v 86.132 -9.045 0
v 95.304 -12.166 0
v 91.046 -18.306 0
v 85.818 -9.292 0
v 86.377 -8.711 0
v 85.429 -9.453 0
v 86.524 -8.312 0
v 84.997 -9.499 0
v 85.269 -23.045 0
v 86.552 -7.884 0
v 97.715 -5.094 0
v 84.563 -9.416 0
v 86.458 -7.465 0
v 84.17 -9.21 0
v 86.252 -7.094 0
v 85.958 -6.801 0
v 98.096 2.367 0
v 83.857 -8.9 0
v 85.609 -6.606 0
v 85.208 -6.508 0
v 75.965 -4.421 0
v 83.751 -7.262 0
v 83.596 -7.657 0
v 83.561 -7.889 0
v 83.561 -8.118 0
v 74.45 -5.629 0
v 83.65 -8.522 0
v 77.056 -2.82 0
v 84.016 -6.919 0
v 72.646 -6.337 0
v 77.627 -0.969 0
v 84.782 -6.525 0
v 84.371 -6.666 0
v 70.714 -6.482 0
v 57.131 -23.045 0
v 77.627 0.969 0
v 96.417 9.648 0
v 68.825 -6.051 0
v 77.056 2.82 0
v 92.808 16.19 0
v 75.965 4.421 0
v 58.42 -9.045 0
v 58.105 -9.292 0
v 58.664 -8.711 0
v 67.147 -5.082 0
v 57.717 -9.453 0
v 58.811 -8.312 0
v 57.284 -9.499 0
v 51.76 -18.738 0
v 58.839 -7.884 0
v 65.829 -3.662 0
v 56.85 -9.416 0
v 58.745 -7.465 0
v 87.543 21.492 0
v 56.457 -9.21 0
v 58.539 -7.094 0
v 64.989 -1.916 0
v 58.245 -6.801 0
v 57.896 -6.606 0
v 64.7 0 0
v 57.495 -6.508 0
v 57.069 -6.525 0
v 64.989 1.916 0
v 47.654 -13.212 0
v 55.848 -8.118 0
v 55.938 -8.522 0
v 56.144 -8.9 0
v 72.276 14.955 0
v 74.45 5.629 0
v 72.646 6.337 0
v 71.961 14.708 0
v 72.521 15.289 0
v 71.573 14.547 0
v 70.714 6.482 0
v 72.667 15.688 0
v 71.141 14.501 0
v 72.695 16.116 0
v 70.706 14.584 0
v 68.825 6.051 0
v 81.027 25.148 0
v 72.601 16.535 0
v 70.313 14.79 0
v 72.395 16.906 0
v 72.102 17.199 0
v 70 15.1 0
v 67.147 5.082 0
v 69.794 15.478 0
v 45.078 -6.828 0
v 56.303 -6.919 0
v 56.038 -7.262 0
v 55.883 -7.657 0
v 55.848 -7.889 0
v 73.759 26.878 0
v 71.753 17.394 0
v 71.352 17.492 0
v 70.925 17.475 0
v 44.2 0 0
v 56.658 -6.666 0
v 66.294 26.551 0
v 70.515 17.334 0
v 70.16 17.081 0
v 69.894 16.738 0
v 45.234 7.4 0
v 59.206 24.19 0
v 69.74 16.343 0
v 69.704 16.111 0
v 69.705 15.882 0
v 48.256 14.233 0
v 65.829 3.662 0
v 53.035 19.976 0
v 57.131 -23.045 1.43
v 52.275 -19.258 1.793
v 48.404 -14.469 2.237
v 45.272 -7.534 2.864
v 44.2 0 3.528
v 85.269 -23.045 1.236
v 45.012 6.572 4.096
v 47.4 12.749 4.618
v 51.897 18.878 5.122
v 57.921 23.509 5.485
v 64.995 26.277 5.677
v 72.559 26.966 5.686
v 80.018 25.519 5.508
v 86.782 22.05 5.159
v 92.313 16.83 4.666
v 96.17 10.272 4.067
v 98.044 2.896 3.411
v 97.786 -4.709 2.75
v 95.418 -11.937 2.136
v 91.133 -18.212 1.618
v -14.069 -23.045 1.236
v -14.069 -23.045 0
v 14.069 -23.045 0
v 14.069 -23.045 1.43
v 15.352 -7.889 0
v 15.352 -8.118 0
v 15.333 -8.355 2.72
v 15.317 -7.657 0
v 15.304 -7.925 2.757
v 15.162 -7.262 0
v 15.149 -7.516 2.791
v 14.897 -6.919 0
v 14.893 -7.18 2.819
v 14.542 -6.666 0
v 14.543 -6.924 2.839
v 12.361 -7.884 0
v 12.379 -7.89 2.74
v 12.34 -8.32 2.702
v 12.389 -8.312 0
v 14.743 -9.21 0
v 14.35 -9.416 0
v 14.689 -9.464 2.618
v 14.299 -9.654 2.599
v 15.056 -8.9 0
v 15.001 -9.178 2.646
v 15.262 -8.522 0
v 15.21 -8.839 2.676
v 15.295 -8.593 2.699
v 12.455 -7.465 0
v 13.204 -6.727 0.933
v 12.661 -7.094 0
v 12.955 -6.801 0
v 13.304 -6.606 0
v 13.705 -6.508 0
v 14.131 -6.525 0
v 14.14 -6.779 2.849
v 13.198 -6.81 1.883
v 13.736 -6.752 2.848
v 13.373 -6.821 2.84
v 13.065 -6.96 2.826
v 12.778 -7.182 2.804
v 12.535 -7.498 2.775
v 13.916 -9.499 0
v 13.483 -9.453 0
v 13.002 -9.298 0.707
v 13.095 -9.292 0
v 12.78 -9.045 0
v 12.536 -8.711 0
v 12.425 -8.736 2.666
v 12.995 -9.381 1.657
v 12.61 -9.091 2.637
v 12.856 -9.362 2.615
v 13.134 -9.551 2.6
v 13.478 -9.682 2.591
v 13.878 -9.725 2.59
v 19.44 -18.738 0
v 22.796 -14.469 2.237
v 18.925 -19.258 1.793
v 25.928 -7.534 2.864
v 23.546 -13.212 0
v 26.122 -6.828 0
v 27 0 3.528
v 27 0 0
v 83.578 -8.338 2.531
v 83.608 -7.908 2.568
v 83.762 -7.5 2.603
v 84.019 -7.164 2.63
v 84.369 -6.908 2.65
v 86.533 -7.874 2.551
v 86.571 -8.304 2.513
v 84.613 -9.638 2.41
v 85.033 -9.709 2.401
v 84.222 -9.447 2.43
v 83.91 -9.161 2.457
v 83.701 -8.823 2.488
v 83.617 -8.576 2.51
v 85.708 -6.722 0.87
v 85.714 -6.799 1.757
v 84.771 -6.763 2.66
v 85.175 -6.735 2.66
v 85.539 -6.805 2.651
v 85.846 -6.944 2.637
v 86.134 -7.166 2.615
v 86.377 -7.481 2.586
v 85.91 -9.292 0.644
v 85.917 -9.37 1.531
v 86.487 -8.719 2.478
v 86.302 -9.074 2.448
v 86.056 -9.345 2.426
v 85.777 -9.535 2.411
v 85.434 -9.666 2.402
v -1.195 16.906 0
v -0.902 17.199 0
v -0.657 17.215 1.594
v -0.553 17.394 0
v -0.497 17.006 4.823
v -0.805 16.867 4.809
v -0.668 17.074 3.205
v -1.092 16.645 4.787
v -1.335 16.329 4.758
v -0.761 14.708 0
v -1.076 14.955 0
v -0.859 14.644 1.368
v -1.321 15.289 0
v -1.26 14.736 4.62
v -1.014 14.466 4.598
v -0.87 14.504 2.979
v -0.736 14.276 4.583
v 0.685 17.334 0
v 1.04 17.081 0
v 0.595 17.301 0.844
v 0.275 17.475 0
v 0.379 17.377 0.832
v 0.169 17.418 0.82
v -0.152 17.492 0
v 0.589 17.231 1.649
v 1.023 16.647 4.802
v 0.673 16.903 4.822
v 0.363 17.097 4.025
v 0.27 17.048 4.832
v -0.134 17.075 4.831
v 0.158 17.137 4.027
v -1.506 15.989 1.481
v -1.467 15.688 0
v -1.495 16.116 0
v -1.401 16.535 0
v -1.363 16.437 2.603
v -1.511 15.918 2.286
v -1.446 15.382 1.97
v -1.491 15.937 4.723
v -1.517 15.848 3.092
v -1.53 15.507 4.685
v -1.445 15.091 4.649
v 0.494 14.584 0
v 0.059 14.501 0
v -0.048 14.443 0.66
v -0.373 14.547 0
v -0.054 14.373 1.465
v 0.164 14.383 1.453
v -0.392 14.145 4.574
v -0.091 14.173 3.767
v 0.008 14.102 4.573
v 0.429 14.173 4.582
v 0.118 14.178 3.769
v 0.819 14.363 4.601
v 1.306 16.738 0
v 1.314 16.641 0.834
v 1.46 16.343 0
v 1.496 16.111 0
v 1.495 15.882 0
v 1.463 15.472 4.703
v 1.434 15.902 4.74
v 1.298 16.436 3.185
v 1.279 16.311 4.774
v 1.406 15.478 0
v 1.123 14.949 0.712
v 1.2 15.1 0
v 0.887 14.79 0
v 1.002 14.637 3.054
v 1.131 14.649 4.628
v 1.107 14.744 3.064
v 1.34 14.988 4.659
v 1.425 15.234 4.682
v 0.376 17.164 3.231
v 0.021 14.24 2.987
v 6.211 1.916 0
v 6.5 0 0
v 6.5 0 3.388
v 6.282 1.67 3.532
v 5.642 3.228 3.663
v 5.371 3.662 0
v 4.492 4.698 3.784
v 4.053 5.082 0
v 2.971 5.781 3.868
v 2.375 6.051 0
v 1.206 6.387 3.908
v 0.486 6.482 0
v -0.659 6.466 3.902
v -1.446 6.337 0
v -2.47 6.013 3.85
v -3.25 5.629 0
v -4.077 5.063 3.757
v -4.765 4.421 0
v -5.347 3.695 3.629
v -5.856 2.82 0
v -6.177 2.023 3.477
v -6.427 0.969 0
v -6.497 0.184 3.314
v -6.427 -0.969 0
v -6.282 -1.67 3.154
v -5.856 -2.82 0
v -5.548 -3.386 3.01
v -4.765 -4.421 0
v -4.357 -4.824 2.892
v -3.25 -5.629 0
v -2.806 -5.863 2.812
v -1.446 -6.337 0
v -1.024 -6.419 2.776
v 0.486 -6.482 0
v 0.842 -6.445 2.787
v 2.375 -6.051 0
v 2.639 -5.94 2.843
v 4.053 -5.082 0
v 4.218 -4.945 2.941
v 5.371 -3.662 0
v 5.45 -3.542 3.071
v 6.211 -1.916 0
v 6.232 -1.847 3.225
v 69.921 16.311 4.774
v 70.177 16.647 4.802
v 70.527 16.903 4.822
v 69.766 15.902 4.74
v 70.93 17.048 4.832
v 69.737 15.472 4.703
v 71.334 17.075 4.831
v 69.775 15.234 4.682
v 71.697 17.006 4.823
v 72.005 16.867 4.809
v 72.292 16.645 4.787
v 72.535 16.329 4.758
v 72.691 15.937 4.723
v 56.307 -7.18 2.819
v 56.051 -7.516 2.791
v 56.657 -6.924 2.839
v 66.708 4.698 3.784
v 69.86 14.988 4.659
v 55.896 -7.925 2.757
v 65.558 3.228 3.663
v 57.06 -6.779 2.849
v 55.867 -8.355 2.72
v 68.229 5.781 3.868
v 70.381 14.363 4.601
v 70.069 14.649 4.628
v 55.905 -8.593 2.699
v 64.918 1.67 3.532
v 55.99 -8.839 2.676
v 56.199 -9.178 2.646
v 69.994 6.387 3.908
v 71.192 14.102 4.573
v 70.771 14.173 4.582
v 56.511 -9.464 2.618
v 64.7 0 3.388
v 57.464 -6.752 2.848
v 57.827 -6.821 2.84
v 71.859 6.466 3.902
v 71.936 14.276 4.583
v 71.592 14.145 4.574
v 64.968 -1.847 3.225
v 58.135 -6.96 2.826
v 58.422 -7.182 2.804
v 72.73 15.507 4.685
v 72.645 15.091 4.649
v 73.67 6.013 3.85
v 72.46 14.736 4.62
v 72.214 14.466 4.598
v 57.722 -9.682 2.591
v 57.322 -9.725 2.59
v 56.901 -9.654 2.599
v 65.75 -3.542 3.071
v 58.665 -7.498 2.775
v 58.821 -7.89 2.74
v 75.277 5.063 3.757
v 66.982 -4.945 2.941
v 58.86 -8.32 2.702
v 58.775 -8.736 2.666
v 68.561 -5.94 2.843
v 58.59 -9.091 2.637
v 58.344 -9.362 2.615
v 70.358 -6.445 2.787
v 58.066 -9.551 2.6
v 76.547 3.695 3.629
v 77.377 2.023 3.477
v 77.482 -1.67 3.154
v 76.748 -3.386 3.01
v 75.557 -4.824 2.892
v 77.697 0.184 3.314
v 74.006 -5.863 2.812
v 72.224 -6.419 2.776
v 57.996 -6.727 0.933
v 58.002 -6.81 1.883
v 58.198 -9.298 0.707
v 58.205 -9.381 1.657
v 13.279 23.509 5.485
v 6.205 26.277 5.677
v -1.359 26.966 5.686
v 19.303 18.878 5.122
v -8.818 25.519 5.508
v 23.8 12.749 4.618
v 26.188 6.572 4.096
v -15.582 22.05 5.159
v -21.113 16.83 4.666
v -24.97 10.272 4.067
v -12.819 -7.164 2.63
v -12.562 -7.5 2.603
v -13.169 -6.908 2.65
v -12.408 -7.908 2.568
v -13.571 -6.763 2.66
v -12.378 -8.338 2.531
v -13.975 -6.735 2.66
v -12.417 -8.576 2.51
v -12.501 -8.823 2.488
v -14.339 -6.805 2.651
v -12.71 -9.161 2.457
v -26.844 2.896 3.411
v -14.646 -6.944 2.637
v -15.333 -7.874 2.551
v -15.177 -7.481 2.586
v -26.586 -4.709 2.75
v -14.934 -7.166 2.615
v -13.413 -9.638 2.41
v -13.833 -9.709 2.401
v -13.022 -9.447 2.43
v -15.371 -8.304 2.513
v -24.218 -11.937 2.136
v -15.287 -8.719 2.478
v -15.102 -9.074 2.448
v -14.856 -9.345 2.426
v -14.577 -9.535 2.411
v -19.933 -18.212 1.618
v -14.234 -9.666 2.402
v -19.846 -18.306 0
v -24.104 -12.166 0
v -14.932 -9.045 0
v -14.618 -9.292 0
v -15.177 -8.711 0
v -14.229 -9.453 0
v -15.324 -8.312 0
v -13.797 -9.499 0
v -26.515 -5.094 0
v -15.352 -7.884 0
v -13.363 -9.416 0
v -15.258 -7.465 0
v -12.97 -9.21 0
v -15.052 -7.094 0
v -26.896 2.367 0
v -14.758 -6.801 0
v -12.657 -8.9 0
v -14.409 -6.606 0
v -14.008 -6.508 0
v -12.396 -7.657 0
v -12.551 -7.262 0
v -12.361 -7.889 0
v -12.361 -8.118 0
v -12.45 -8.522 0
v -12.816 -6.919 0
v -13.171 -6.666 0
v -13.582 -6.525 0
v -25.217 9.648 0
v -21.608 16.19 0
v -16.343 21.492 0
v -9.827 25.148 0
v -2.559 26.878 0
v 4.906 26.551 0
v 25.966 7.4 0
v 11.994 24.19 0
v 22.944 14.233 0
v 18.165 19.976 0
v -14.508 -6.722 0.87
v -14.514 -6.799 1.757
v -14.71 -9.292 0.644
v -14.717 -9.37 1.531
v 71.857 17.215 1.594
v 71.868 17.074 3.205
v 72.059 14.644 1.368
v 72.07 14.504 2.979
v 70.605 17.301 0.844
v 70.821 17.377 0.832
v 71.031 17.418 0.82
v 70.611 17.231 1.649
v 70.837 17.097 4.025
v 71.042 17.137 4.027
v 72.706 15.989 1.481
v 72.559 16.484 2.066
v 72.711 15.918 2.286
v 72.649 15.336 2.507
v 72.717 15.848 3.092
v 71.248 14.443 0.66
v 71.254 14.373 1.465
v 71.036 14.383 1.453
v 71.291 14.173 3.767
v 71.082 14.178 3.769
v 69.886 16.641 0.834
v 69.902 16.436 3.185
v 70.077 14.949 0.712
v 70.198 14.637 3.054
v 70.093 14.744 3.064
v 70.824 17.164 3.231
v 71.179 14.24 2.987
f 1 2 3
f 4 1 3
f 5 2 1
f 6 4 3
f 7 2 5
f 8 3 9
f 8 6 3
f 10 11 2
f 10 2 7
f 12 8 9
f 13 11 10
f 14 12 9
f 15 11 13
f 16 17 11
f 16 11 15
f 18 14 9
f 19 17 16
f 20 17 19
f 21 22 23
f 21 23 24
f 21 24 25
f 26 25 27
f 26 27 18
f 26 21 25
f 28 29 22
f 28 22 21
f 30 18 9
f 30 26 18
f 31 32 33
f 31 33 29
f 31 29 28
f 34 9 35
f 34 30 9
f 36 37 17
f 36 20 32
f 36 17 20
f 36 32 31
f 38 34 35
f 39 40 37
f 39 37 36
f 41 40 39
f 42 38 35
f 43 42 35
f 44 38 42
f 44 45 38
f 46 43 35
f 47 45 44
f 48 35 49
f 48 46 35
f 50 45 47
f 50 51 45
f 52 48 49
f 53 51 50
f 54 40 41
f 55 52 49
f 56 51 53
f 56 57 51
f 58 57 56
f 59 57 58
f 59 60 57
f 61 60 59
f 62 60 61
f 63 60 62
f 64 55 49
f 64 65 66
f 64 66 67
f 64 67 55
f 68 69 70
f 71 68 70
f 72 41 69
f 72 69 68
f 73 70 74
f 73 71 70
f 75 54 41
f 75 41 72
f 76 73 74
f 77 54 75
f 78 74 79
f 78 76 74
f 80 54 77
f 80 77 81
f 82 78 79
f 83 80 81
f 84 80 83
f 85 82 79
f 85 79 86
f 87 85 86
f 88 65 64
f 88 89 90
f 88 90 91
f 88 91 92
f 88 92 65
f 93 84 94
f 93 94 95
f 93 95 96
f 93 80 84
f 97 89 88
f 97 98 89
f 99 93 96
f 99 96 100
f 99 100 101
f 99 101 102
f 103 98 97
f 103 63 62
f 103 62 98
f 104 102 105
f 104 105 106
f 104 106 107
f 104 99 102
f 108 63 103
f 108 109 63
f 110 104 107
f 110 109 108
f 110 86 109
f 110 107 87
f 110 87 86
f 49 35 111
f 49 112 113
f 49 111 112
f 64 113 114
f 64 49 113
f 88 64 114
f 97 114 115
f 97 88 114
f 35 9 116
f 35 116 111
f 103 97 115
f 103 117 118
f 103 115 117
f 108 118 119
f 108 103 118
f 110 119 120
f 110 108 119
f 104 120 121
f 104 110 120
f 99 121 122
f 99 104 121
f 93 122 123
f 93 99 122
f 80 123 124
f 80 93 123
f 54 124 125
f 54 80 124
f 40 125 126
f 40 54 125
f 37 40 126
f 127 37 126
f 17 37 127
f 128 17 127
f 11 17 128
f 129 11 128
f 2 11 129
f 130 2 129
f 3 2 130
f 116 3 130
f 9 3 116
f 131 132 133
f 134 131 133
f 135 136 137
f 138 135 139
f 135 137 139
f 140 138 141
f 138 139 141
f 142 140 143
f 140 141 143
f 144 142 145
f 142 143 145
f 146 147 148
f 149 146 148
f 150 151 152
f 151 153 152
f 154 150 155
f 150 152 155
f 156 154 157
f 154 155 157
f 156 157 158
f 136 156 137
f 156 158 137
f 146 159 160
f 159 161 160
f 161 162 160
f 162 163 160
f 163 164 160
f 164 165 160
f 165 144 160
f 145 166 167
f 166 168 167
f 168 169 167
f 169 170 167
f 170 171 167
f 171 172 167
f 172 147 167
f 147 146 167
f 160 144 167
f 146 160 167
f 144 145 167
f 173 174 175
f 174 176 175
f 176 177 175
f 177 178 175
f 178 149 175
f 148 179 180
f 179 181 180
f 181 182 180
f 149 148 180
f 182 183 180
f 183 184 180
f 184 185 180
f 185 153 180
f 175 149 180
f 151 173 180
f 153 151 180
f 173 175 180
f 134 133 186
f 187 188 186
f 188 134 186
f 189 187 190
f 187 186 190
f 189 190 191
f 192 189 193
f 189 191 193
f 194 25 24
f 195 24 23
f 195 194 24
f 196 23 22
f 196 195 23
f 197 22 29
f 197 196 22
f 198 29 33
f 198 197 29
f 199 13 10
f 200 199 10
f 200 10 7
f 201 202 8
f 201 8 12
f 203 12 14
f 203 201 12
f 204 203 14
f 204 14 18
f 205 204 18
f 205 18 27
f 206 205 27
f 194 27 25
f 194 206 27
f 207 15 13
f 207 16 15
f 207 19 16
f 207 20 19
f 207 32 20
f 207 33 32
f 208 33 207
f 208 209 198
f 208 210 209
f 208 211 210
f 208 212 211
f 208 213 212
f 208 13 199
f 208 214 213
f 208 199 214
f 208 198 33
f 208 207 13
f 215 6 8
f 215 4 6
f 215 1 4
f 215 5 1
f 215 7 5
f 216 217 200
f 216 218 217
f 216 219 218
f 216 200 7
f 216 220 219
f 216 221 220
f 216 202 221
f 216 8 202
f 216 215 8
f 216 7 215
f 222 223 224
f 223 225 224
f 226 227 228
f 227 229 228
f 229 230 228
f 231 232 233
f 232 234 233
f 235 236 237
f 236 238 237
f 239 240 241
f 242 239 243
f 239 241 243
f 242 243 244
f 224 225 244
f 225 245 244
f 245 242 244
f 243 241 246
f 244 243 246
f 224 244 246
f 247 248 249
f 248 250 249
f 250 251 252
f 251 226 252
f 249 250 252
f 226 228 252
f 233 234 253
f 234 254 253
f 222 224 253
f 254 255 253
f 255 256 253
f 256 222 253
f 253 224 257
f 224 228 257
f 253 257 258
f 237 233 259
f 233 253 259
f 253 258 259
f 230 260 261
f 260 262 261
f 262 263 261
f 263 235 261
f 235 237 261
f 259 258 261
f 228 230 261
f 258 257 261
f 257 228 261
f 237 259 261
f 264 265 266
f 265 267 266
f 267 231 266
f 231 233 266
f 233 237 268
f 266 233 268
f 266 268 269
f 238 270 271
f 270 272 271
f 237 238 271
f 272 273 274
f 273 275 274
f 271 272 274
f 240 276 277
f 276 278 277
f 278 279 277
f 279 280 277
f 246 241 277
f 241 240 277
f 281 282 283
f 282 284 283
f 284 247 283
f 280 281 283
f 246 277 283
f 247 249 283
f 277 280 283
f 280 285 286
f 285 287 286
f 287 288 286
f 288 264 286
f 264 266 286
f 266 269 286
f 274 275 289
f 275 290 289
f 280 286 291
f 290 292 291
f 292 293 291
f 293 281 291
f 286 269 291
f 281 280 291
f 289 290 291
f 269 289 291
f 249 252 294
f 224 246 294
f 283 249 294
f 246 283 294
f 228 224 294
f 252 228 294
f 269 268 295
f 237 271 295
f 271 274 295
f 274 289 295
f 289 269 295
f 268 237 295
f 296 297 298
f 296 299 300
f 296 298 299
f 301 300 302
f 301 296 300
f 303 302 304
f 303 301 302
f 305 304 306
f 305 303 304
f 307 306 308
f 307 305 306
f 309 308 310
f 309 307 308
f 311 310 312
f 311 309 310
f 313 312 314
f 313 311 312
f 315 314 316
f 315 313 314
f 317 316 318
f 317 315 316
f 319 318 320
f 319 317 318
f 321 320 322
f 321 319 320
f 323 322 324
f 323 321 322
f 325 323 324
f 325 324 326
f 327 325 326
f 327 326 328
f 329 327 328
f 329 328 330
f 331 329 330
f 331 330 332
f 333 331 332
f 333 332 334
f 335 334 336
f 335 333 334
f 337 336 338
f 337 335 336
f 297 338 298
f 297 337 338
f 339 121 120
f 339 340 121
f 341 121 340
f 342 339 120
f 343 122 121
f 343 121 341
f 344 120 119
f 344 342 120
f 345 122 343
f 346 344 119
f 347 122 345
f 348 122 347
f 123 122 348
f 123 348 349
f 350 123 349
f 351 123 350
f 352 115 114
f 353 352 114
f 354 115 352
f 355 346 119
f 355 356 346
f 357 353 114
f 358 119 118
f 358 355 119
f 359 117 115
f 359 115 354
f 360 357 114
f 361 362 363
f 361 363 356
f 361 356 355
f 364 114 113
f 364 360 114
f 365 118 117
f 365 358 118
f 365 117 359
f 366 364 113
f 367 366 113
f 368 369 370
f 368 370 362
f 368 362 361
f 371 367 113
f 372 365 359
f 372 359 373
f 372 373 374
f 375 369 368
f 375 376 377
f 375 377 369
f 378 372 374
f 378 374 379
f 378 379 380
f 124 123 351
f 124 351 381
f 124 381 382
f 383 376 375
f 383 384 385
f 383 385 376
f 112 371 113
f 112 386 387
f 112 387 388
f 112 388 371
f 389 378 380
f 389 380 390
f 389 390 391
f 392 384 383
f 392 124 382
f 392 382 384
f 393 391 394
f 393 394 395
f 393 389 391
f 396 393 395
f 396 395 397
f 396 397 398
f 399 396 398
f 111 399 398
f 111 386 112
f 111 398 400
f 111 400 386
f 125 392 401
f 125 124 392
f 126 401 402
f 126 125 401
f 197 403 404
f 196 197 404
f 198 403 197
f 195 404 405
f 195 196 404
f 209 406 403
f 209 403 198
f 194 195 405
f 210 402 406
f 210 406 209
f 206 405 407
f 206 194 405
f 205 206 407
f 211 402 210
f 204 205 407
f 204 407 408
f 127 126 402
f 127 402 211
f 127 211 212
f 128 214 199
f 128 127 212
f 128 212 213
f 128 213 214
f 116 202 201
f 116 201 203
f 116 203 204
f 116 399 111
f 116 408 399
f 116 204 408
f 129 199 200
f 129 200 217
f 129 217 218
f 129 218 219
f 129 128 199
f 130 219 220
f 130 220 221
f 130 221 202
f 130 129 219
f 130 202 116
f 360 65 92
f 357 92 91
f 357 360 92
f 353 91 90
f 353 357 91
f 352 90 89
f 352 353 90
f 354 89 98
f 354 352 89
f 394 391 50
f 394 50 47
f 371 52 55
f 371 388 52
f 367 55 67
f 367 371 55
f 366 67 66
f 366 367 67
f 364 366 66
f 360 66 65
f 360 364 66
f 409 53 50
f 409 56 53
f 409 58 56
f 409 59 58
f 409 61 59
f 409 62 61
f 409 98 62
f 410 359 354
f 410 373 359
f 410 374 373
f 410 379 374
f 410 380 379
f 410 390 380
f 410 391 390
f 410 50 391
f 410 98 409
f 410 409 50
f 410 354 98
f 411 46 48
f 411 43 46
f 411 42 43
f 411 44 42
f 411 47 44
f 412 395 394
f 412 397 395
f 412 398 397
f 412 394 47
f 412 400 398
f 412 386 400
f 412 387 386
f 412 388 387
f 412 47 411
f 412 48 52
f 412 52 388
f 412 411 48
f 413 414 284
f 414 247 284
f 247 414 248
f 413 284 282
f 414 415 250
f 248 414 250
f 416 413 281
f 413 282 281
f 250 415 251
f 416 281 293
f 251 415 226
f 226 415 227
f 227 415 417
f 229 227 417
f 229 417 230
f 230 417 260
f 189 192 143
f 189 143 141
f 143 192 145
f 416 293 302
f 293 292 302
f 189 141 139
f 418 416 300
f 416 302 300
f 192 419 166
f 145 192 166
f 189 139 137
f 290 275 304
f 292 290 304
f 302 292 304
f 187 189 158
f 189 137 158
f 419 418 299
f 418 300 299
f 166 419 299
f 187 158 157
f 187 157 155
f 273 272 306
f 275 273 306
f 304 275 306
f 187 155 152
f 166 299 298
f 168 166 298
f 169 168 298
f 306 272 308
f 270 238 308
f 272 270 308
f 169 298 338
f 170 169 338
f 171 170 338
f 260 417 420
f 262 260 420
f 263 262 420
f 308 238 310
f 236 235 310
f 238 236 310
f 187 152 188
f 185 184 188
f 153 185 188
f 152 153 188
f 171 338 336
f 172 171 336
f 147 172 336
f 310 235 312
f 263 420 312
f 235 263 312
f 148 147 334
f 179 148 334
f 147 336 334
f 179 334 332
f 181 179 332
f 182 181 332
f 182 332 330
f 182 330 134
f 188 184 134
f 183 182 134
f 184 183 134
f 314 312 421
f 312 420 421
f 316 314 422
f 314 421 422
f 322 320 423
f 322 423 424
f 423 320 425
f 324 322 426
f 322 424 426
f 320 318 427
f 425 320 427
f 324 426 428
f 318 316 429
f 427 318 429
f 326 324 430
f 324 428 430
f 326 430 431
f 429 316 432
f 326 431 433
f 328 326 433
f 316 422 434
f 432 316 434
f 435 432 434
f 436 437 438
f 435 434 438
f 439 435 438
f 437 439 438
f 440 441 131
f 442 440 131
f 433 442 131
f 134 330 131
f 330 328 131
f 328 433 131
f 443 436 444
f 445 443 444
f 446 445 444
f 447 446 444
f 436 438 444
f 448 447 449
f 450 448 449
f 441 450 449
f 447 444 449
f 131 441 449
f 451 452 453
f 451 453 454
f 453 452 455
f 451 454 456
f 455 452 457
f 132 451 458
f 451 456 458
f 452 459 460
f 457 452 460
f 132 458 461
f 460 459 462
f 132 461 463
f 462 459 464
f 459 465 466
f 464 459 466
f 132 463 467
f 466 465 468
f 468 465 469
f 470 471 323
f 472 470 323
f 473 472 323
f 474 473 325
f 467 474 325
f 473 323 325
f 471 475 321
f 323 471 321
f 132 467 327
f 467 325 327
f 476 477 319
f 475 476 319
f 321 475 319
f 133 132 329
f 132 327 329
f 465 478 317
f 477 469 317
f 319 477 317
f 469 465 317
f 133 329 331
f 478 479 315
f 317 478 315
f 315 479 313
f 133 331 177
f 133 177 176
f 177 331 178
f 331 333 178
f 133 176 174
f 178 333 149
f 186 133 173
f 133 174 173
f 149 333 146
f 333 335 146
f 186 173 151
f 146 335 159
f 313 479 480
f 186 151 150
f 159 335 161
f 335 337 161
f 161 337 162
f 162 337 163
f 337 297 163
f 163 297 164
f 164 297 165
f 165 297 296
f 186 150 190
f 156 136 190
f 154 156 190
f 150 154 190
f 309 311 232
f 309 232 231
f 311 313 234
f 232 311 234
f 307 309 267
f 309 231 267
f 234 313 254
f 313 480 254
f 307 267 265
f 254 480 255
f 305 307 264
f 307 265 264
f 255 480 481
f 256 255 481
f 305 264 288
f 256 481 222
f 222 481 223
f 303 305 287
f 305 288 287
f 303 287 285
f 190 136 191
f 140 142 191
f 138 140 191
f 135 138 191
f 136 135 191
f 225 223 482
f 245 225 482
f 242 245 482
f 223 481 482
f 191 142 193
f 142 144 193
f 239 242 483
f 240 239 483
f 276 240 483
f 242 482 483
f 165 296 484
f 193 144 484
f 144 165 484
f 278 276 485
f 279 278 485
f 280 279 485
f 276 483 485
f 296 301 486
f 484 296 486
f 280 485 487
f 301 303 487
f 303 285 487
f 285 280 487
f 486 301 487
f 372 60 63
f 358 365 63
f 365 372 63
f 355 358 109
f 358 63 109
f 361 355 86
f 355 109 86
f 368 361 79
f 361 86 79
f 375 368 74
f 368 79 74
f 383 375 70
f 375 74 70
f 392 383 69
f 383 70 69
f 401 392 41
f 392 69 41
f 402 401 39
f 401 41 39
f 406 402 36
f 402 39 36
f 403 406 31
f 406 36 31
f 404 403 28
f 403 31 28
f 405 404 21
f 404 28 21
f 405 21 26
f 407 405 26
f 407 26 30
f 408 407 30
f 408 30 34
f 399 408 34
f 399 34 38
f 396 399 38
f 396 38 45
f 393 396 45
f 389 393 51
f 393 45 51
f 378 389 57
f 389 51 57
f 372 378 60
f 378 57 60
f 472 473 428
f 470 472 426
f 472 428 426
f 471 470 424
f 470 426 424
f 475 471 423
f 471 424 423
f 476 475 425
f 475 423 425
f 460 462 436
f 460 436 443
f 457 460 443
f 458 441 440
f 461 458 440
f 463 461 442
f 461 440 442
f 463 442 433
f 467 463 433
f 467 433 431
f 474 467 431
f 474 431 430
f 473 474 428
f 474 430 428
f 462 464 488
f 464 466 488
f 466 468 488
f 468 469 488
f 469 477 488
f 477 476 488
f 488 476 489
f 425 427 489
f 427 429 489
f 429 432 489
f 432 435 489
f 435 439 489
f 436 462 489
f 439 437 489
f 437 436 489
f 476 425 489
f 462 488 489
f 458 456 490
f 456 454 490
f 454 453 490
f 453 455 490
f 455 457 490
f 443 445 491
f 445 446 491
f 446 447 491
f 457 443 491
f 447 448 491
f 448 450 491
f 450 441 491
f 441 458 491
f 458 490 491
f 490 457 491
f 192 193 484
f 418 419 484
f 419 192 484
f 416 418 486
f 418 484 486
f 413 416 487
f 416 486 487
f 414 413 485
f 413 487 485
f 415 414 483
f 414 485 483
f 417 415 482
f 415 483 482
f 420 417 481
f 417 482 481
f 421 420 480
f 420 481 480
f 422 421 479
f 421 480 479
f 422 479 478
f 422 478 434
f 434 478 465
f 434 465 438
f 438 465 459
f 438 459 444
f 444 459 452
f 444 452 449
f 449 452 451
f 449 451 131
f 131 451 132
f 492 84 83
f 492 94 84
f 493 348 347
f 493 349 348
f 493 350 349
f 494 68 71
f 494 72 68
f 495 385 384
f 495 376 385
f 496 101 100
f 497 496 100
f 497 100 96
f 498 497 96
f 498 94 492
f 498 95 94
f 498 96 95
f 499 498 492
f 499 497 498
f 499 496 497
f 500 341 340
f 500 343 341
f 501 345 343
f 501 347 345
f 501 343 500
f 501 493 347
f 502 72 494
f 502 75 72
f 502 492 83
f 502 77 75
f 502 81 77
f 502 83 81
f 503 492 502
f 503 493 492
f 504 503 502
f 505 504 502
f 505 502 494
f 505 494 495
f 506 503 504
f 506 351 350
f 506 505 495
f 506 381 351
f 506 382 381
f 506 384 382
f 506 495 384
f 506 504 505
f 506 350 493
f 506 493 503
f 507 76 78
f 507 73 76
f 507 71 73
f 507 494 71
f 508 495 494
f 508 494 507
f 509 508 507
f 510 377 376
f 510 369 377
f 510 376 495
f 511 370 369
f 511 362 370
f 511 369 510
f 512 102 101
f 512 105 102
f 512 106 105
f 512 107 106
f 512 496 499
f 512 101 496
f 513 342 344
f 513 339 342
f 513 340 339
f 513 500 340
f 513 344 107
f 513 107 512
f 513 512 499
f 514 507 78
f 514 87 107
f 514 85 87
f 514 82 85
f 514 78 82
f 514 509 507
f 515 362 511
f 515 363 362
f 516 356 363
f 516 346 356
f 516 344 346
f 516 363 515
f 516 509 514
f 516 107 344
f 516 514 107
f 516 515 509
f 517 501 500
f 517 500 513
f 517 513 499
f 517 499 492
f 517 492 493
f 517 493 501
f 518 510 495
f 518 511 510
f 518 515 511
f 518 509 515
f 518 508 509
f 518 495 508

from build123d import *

# Parameters (mm, degrees)
F0_R     = 6.5
F1_DEPTH = 25
F5_DEPTH = 50
F7_DEPTH = 5.861862694


with BuildPart() as f1:
    # F0 (on Top) → F1 (new body)
    with BuildSketch(Plane.XY):
        with BuildLine():
            ThreePointArc((14.0692943446, -23.0446296704), (23.546453526, -13.2122869462), (27, 0))
            ThreePointArc((27, 0), (-13.2122869462, 23.546453526), (-14.0692943446, -23.0446296704))
            Line((-14.0692943446, -23.0446296704), (14.0692943446, -23.0446296704))
        make_face()
        Circle(F0_R, mode=Mode.SUBTRACT)
    extrude(amount=F1_DEPTH)

    # F4 (on 3pt) → F5 (cut, symmetric)
    with BuildSketch(Plane(origin=(0, 0, 0), x_dir=(-0.0784590957, -0.9969173337, 0), z_dir=(-0.9969173337, 0.0784590957, 0))):
        Polygon((33.1225750617, 31.4058586955), (-31.078401953, 31.4058586955), (-31.078401953, 6.0620104305), (33.1225750617, 0.4451527544), align=None)
    extrude(amount=F5_DEPTH, both=True, mode=Mode.SUBTRACT)

    # F6 (on face) → F7 (cut, through all)
    with BuildSketch(Plane(origin=(-0.0227729999, -0.2893583993, 3.3176087187), x_dir=(0.9999766195, -0.0005941616, 0.0068122988), z_dir=(-0.0068381608, -0.0868870707, 0.9961946981))):
        with BuildLine():
            add(Edge.make_bspline(
                [(1.4859043777, 15.8222442986), (1.6882034033, 18.4025158484), (-0.6560625556, 17.2882453895), (-3.0003285145, 16.1739749305), (-0.8583615812, 14.7079738397), (1.283605352, 13.2419727488), (1.4859043777, 15.8222442986)],
                knots=[0, 0, 0, 2.0943951024, 2.0943951024, 4.1887902048, 4.1887902048, 6.2831853072, 6.2831853072, 6.2831853072], degree=2, weights=[1, 0.5, 1, 0.5, 1, 0.5, 1]))
        make_face()
        with BuildLine():
            add(Edge.make_bspline(
                [(-12.3559182337, -8.0869874653), (-12.153619208, -5.5067159155), (-14.4978851669, -6.6209863744), (-16.8421511258, -7.7352568333), (-14.7001841926, -9.2012579242), (-12.5582172593, -10.6672590151), (-12.3559182337, -8.0869874653)],
                knots=[0, 0, 0, 2.0943951024, 2.0943951024, 4.1887902048, 4.1887902048, 6.2831853072, 6.2831853072, 6.2831853072], degree=2, weights=[1, 0.5, 1, 0.5, 1, 0.5, 1]))
        make_face()
        with BuildLine():
            add(Edge.make_bspline(
                [(15.3562467482, -8.0869874653), (15.5585457738, -5.5067159155), (13.2142798149, -6.6209863744), (10.870013856, -7.7352568333), (13.0119807893, -9.2012579242), (15.1539477225, -10.6672590151), (15.3562467482, -8.0869874653)],
                knots=[0, 0, 0, 2.0943951024, 2.0943951024, 4.1887902048, 4.1887902048, 6.2831853072, 6.2831853072, 6.2831853072], degree=2, weights=[1, 0.5, 1, 0.5, 1, 0.5, 1]))
        make_face()
    extrude(amount=-F7_DEPTH, mode=Mode.SUBTRACT)


with BuildPart() as f9_1:
    # F9: instance of F1
    add(f1.part.mirror(Plane.YZ.offset(35.6)))


solid = Compound([f1.part, f9_1.part])
